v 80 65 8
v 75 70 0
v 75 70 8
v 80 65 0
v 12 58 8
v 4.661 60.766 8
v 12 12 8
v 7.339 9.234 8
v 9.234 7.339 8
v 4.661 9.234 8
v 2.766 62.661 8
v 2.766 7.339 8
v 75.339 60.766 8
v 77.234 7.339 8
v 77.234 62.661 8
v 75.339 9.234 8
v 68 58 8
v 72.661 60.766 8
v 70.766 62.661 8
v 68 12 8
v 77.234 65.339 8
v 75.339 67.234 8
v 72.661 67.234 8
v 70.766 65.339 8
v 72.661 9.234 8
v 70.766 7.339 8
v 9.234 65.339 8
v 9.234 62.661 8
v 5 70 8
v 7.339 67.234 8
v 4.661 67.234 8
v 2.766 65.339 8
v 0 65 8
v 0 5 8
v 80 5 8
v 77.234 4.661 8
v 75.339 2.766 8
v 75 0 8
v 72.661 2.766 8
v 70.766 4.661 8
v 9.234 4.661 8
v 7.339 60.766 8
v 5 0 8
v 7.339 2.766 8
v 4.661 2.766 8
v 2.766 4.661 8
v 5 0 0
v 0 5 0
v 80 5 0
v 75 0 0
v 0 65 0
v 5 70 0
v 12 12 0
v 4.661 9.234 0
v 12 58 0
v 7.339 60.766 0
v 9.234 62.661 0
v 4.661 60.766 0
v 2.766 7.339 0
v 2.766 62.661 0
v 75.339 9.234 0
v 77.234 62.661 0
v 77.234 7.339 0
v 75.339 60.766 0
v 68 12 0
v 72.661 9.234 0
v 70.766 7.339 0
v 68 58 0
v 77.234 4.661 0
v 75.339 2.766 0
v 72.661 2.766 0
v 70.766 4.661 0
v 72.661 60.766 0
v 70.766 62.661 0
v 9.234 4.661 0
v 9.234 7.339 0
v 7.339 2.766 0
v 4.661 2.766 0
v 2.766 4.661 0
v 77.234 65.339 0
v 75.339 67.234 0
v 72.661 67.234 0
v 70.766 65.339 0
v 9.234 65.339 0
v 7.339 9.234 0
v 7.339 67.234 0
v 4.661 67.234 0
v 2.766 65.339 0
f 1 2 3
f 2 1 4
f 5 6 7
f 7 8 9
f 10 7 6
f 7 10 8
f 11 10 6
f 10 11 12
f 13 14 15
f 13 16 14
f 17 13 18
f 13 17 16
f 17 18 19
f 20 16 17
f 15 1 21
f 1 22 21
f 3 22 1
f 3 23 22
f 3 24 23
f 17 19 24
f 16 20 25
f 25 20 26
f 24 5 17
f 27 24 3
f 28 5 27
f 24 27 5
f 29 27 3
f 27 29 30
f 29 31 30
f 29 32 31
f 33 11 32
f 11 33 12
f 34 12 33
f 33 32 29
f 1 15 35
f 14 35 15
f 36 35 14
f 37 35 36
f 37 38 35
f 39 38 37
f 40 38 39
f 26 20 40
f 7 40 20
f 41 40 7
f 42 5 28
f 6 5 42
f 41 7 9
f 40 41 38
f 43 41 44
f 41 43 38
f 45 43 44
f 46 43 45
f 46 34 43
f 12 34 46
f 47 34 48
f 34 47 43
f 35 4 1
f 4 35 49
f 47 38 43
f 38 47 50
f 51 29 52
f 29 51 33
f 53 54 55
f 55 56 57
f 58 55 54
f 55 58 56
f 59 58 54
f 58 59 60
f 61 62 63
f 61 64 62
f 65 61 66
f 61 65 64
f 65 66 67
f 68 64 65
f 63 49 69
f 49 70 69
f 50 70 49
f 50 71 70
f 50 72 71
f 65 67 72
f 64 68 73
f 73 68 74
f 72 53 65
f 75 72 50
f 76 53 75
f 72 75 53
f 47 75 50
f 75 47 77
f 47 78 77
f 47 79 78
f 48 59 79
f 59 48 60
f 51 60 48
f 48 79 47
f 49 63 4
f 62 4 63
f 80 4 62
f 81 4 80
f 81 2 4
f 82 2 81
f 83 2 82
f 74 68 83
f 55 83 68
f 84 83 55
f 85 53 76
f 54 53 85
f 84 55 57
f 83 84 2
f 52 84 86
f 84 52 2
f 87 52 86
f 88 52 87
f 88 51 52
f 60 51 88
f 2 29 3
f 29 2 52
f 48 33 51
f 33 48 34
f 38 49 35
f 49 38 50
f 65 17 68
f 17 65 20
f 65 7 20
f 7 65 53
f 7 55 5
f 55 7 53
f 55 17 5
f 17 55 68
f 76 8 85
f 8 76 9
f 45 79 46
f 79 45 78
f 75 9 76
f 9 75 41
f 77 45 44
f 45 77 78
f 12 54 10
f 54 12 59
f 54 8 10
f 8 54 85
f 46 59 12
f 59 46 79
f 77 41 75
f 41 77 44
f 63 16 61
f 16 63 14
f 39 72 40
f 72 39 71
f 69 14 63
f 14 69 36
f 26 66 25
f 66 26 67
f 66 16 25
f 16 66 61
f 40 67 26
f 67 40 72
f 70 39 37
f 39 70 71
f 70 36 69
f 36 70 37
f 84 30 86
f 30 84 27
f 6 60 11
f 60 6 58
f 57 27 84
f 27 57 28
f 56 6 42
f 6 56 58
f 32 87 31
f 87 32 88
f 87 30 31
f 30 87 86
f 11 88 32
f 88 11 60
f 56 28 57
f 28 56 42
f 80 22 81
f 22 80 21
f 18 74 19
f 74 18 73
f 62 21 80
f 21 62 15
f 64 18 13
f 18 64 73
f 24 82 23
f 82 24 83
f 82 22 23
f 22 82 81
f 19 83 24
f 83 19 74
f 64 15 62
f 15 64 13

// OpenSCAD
$fn = 32;

// ----------------------------------------------------------------------
// Frame plate: 80 x 70 frame, 12 mm rails
// ----------------------------------------------------------------------

// --- parameters (mm) ---
plate_l = 80;             // plate length, X
plate_w = 70;             // plate width, Y
plate_t = 8;              // plate thickness, Z (extrusion height)
corner_c = 5;             // corner chamfer
frame_bar = 12;           // frame rail width
bolt_r = 3.5;             // corner bolt window radius
bolt_inset = 6;           // bolt centre inset from the edges

win_l = plate_l - 2 * frame_bar;  // window length
win_w = plate_w - 2 * frame_bar;  // window width
bolt_d = 2 * bolt_r;  // corner hole diameter

profile = [[5, 0], [75, 0], [80, 5], [80, 65], [75, 70], [5, 70], [0, 65], [0, 5]];  // primary outline, 8 points, counter clockwise
void_1 = [[12, 12], [68, 12], [68, 58], [12, 58]];  // the window, 4 points
void_2 = [[9.234, 7.339], [7.339, 9.234], [4.661, 9.234], [2.766, 7.339], [2.766, 4.661], [4.661, 2.766], [7.339, 2.766], [9.234, 4.661]];  // corner bolt window, 8 points
void_3 = [[77.234, 7.339], [75.339, 9.234], [72.661, 9.234], [70.766, 7.339], [70.766, 4.661], [72.661, 2.766], [75.339, 2.766], [77.234, 4.661]];  // corner bolt window, 8 points
void_4 = [[9.234, 65.339], [7.339, 67.234], [4.661, 67.234], [2.766, 65.339], [2.766, 62.661], [4.661, 60.766], [7.339, 60.766], [9.234, 62.661]];  // corner bolt window, 8 points
void_5 = [[77.234, 65.339], [75.339, 67.234], [72.661, 67.234], [70.766, 65.339], [70.766, 62.661], [72.661, 60.766], [75.339, 60.766], [77.234, 62.661]];  // corner bolt window, 8 points

// --- the one profile operation ---
difference() {
  linear_extrude(height = plate_t) polygon(points = profile);
  translate([0, 0, -1])
    linear_extrude(height = plate_t + 2) polygon(points = void_1);
  translate([0, 0, -1])
    linear_extrude(height = plate_t + 2) polygon(points = void_2);
  translate([0, 0, -1])
    linear_extrude(height = plate_t + 2) polygon(points = void_3);
  translate([0, 0, -1])
    linear_extrude(height = plate_t + 2) polygon(points = void_4);
  translate([0, 0, -1])
    linear_extrude(height = plate_t + 2) polygon(points = void_5);
}
